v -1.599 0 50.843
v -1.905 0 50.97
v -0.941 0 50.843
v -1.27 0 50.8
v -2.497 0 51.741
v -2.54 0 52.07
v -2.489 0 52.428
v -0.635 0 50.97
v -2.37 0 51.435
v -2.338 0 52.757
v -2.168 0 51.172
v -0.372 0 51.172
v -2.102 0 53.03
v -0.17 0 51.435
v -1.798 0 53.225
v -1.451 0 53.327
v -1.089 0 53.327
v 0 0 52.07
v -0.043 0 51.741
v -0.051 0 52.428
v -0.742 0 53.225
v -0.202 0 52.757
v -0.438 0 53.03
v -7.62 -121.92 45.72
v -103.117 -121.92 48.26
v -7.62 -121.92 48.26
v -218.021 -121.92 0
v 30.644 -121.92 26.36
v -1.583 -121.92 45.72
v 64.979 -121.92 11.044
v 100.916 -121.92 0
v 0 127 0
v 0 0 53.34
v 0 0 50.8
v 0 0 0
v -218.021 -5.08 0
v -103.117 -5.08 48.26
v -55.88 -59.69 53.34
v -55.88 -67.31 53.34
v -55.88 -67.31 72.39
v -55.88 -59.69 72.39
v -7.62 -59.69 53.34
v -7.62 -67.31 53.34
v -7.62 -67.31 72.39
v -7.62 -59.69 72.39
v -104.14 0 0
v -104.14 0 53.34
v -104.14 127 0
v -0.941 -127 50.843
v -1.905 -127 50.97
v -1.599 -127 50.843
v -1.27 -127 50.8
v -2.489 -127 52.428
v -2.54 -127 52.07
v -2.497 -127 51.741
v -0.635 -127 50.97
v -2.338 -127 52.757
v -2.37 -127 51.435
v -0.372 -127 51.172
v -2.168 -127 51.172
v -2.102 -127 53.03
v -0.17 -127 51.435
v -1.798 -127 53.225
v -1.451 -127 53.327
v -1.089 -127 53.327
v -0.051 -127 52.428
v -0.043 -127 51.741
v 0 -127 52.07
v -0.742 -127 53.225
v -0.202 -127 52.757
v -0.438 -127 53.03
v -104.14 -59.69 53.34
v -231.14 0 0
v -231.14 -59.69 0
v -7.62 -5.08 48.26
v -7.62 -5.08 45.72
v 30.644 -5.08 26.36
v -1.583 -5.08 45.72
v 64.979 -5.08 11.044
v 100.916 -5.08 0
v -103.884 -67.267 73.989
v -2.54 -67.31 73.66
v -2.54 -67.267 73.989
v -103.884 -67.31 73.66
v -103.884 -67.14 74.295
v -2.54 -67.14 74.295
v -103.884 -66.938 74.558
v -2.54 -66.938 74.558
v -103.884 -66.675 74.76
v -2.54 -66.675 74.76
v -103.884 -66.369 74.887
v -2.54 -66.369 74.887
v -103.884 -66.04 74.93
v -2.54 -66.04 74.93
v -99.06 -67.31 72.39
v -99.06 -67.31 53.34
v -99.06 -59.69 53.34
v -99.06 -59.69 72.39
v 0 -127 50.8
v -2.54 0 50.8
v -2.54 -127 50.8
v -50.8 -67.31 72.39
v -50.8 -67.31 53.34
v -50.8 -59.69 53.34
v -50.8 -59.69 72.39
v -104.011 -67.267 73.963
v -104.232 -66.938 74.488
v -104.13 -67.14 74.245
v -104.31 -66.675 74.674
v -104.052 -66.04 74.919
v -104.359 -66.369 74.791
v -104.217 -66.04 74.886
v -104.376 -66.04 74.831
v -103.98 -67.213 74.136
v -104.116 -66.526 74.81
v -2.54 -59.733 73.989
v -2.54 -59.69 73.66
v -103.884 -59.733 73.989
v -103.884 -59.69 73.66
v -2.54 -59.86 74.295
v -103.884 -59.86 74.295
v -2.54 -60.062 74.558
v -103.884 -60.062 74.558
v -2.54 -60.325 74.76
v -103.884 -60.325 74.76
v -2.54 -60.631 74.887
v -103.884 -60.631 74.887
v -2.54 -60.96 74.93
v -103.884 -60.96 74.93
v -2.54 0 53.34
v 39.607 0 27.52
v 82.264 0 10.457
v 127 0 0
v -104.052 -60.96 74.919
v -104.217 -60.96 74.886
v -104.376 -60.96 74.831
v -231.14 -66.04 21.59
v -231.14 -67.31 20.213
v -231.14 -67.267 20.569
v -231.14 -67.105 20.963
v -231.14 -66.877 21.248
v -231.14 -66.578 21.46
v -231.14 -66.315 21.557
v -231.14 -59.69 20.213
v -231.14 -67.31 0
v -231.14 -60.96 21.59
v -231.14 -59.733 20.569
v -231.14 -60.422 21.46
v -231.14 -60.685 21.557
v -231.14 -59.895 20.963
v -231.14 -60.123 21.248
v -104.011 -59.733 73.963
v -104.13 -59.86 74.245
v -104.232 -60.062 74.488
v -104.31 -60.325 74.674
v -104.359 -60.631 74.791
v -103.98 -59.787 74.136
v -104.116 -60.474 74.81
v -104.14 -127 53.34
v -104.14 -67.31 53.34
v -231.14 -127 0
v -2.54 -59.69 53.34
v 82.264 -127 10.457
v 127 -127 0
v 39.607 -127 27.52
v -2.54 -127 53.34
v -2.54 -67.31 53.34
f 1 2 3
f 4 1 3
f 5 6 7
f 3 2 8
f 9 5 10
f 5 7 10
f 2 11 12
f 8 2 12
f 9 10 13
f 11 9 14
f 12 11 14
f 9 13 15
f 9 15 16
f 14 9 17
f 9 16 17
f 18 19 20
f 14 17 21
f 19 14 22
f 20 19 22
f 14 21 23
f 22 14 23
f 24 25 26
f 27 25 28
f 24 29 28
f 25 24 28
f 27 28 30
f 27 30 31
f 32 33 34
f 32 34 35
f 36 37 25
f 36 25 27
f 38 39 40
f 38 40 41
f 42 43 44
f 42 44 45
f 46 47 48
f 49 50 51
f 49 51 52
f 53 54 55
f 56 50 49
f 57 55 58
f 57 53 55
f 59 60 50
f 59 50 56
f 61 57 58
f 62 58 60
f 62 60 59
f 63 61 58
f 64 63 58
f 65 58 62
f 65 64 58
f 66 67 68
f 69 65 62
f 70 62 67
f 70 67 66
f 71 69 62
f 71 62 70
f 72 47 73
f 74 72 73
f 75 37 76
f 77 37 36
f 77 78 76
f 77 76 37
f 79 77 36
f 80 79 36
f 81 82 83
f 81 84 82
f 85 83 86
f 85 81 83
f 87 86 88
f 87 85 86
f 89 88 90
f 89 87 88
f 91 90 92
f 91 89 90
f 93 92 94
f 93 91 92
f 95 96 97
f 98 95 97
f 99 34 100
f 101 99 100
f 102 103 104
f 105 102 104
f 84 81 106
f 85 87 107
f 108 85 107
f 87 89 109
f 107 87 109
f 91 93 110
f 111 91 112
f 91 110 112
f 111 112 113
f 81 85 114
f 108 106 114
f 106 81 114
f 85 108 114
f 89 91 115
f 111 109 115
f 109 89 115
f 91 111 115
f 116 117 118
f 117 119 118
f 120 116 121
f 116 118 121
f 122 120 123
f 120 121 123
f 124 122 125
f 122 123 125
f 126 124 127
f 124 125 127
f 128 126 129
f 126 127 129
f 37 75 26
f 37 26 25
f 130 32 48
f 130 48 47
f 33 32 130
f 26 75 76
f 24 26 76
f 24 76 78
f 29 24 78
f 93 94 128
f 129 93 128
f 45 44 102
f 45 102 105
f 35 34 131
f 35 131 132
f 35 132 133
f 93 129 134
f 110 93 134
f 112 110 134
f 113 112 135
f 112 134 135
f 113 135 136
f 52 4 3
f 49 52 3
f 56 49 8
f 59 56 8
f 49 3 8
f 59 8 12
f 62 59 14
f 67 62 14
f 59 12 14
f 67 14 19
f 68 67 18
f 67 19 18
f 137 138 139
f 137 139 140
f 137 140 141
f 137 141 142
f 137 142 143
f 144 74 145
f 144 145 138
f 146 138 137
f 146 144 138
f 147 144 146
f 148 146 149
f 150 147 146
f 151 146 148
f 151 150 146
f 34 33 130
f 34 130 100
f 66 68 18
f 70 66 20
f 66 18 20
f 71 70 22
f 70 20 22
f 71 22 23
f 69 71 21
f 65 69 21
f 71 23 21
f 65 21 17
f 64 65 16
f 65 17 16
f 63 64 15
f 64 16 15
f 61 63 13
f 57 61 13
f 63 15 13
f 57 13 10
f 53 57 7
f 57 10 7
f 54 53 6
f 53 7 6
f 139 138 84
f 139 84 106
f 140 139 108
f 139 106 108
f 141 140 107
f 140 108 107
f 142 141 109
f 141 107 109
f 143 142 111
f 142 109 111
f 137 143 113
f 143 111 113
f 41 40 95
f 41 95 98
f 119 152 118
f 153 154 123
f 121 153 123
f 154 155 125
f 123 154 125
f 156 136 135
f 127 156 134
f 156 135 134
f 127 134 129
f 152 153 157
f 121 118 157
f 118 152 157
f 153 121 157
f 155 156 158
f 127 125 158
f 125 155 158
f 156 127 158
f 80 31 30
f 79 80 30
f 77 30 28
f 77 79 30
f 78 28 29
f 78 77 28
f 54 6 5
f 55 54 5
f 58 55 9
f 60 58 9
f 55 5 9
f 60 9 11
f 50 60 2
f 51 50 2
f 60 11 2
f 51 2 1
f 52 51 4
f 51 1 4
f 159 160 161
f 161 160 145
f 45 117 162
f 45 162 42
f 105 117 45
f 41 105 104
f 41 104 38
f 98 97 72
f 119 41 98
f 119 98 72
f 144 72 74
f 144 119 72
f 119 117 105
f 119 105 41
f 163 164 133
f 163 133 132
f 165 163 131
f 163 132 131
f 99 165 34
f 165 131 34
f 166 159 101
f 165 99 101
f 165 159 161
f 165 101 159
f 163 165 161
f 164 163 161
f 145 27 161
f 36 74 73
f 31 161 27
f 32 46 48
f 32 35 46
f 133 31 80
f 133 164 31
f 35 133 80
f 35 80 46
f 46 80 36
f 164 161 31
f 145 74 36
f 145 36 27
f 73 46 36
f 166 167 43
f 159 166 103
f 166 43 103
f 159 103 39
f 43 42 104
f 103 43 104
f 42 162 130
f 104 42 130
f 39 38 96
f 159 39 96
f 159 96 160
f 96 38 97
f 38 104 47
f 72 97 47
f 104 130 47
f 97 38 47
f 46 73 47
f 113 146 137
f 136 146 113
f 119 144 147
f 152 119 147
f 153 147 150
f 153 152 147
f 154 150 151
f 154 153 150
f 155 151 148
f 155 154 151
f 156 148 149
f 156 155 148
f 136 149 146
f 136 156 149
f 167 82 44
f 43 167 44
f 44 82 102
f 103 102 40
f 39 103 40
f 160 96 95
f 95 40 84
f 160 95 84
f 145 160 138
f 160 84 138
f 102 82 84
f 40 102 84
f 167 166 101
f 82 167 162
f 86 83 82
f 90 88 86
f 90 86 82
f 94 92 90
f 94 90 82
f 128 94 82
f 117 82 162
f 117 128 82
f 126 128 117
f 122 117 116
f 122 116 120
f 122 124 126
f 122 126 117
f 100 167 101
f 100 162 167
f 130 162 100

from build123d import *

# Parameters (mm, degrees)
F1_DEPTH     = 127
F2_W         = 5.08
F2_H         = 7.62
F3_DEPTH     = 19.05
F4_W         = 7.62
F4_H         = 2.54
F5_DEPTH     = 101.6
F6_T         = 5.08
F6_T3_DEPTH  = 17.78
F6_T5_DEPTH  = 15.24
F6_T7_DEPTH  = 15.24
F6_T9_DEPTH  = 15.24
F6_T11_DEPTH = 137.16
F8_DEPTH     = 7.62
F10_DEPTH    = 104.14
F11_R        = 1.27


# Not quite as in the source:
# - a shell that OpenCascade refuses in one call is made with other operations: the cavity is built on its own and cut out
# - a feature names something its author has since deleted; it is built from what else it names


with BuildPart() as f1:
    # F0 (on Front) → F1 (new body)
    with BuildSketch(Plane.XZ):
        with BuildLine():
            Line((0, 50.8), (0, 0))
            Line((0, 0), (127, 0))
            ThreePointArc((127, 0), (60.6135499229, 18.1838748072), (0, 50.8))
        make_face()
        Polygon((-104.14, 0), (-2.54, 0), (-2.54, 50.8), (-2.54, 52.07), (-2.54, 53.34), (-104.14, 53.34), align=None)
        Polygon((-2.54, 0), (0, 0), (0, 50.8), (-1.27, 50.8), (-2.54, 50.8), align=None)
        Polygon((-231.14, 0), (-104.14, 0), (-104.14, 53.34), align=None)
    extrude(amount=F1_DEPTH)

    # F2 (on face) → F3 (join)
    with BuildSketch(Plane.XY.offset(53.34)):
        with Locations((-101.6, -63.5)):
            Rectangle(F2_W, F2_H)
        with Locations((-5.08, -63.5)):
            Rectangle(F2_W, F2_H)
        with Locations((-53.34, -63.5)):
            Rectangle(F2_W, F2_H)
    extrude(amount=F3_DEPTH)

    # F4 (on face) → F5 (join)
    with BuildSketch(Plane.YZ.offset(-2.54)):
        with Locations((-63.5, 73.66)):
            Rectangle(F4_W, F4_H)
    extrude(amount=-F5_DEPTH)

    # F6: shell of thickness 5.08, made by hand


with BuildPart() as f1b:
    # F0 (on Front) → F1, piece 2 (new body)
    with BuildSketch(Plane.XZ):
        with BuildLine():
            ThreePointArc((-2.54, 52.07), (-2.1680256121, 51.1719743879), (-1.27, 50.8))
            ThreePointArc((-1.27, 50.8), (-0.3719743879, 51.1719743879), (0, 52.07))
            ThreePointArc((0, 52.07), (-1.27, 53.34), (-2.54, 52.07))
        make_face()
    extrude(amount=F1_DEPTH)


with BuildPart() as f6_core1:
    # F6_t2: copy of F1
    add(f1.part)

    # the walls: a layer under each face that stays
    f6_faces = [f6_core1.faces().sort_by_distance(p)[0] for p in [
        (60.6135499229, -63.5, 18.1838748072),
        (-52.07, -127, 26.67),
        (-167.64, -63.5, 26.67),
        (-104.14, -63.5, 64.135),
        (-53.34, -67.31, 64.135),
        (-99.06, -63.5, 62.865),
        (-77.47, -63.5, 72.39),
        (-55.88, -63.5, 62.865),
        (-50.8, -63.5, 62.865),
        (-29.21, -63.5, 72.39),
        (-7.62, -63.5, 62.865),
        (-53.34, -63.5, 74.93),
        (-53.34, -59.69, 64.135),
        (-19.4733333333, -105.8333333333, 53.34),
        (-2.54, -63.5, 62.865),
        (-52.07, 0, 26.67),
        (-1.27, -63.5, 50.8),
    ]]
    thicken(f6_faces, amount=-F6_T, mode=Mode.SUBTRACT)

    # F6_s4 → F6_t3 (cut)
    with BuildSketch(Plane.XZ.offset(54.61)):
        Polygon((-104.2104714102, 53.386836691), (-102.1728589795, 48.6563309035), (-99.06, 49.9637316749), (-99.06, 53.34), align=None)
        Polygon((-99.0092, 53.3908), (-104.14, 53.34), (-104.14, 48.26), (-99.06, 48.26), align=None)
        Polygon((-99.0092, 72.3392), (-104.14, 72.39), (-104.14, 77.47), (-99.06, 77.47), align=None)
        Polygon((-55.9308, 72.3392), (-55.88, 77.47), (-50.8, 77.47), (-50.8, 72.39), align=None)
        Polygon((-55.9308, 53.3908), (-50.8, 53.34), (-50.8, 48.26), (-55.88, 48.26), align=None)
        Polygon((-50.7492, 53.3908), (-55.88, 53.34), (-55.88, 48.26), (-50.8, 48.26), align=None)
        Polygon((-50.7492, 72.3392), (-55.88, 72.39), (-55.88, 77.47), (-50.8, 77.47), align=None)
        Polygon((-7.6708, 72.3392), (-7.62, 77.47), (-2.54, 77.47), (-2.54, 72.39), align=None)
        Polygon((-7.6708, 53.3908), (-2.54, 53.34), (-2.54, 48.26), (-7.62, 48.26), align=None)
    extrude(amount=F6_T3_DEPTH, mode=Mode.SUBTRACT)

    # F6_s6 → F6_t5 (cut)
    with BuildSketch(Plane.YZ.offset(-60.96)):
        Polygon((-67.3608, 53.3908), (-62.23, 53.34), (-62.23, 48.26), (-67.31, 48.26), align=None)
        Polygon((-59.6392, 53.3908), (-64.77, 53.34), (-64.77, 48.26), (-59.69, 48.26), align=None)
    extrude(amount=F6_T5_DEPTH, mode=Mode.SUBTRACT)

    # F6_s8 → F6_t7 (cut)
    with BuildSketch(Plane.YZ.offset(-109.22)):
        Polygon((-67.3608, 53.3908), (-62.23, 53.34), (-62.23, 48.26), (-67.31, 48.26), align=None)
        Polygon((-59.6392, 53.3908), (-64.77, 53.34), (-64.77, 48.26), (-59.69, 48.26), align=None)
    extrude(amount=F6_T7_DEPTH, mode=Mode.SUBTRACT)

    # F6_s10 → F6_t9 (cut)
    with BuildSketch(Plane.YZ.offset(-12.7)):
        Polygon((-67.3608, 53.3908), (-62.23, 53.34), (-62.23, 48.26), (-67.31, 48.26), align=None)
        Polygon((-59.6392, 53.3908), (-64.77, 53.34), (-64.77, 48.26), (-59.69, 48.26), align=None)
    extrude(amount=F6_T9_DEPTH, mode=Mode.SUBTRACT)

    # F6_s12 → F6_t11 (cut)
    with BuildSketch(Plane.XZ.offset(-5.08)):
        Polygon((-2.4892, 50.8508), (-7.62, 50.8), (-7.62, 45.72), (-2.54, 45.72), align=None)
    extrude(amount=F6_T11_DEPTH, mode=Mode.SUBTRACT)


with BuildPart() as f1_1:
    add(f1.part)

    # what is left inside the walls is the cavity
    f6_cavity = [f6_core1.part.solids().sort_by_distance(p)[0] for p in [
        (-58.552758, -82.973333, 0.0508),
    ]]
    add(f6_cavity, mode=Mode.SUBTRACT)

    # F7 (on face) → F8 (join)
    with BuildSketch(Plane(origin=(0, -59.69, 0), x_dir=(-1, 0, 0), z_dir=(0, 1, 0))):
        Polygon((231.14, 21.59), (104.14, 74.93), (104.14, 53.34), (231.14, 0), align=None)
    extrude(amount=-F8_DEPTH)

    # F9 (on Right) → F10 (join)
    with BuildSketch(Plane.YZ):
        Polygon((127, 0), (0, 53.34), (0, 0), align=None)
    extrude(amount=-F10_DEPTH)

    # F11
    f11_edges = [f1_1.edges().sort_by_distance(p)[0] for p in [
        (-53.34, -67.31, 74.93),
        (-167.64, -67.31, 48.26),
        (-104.14, -63.5, 74.93),
        (-167.64, -59.69, 48.26),
        (-53.34, -59.69, 74.93),
    ]]
    fillet(f11_edges, radius=F11_R)


solid = Compound([f1b.part, f1_1.part])
